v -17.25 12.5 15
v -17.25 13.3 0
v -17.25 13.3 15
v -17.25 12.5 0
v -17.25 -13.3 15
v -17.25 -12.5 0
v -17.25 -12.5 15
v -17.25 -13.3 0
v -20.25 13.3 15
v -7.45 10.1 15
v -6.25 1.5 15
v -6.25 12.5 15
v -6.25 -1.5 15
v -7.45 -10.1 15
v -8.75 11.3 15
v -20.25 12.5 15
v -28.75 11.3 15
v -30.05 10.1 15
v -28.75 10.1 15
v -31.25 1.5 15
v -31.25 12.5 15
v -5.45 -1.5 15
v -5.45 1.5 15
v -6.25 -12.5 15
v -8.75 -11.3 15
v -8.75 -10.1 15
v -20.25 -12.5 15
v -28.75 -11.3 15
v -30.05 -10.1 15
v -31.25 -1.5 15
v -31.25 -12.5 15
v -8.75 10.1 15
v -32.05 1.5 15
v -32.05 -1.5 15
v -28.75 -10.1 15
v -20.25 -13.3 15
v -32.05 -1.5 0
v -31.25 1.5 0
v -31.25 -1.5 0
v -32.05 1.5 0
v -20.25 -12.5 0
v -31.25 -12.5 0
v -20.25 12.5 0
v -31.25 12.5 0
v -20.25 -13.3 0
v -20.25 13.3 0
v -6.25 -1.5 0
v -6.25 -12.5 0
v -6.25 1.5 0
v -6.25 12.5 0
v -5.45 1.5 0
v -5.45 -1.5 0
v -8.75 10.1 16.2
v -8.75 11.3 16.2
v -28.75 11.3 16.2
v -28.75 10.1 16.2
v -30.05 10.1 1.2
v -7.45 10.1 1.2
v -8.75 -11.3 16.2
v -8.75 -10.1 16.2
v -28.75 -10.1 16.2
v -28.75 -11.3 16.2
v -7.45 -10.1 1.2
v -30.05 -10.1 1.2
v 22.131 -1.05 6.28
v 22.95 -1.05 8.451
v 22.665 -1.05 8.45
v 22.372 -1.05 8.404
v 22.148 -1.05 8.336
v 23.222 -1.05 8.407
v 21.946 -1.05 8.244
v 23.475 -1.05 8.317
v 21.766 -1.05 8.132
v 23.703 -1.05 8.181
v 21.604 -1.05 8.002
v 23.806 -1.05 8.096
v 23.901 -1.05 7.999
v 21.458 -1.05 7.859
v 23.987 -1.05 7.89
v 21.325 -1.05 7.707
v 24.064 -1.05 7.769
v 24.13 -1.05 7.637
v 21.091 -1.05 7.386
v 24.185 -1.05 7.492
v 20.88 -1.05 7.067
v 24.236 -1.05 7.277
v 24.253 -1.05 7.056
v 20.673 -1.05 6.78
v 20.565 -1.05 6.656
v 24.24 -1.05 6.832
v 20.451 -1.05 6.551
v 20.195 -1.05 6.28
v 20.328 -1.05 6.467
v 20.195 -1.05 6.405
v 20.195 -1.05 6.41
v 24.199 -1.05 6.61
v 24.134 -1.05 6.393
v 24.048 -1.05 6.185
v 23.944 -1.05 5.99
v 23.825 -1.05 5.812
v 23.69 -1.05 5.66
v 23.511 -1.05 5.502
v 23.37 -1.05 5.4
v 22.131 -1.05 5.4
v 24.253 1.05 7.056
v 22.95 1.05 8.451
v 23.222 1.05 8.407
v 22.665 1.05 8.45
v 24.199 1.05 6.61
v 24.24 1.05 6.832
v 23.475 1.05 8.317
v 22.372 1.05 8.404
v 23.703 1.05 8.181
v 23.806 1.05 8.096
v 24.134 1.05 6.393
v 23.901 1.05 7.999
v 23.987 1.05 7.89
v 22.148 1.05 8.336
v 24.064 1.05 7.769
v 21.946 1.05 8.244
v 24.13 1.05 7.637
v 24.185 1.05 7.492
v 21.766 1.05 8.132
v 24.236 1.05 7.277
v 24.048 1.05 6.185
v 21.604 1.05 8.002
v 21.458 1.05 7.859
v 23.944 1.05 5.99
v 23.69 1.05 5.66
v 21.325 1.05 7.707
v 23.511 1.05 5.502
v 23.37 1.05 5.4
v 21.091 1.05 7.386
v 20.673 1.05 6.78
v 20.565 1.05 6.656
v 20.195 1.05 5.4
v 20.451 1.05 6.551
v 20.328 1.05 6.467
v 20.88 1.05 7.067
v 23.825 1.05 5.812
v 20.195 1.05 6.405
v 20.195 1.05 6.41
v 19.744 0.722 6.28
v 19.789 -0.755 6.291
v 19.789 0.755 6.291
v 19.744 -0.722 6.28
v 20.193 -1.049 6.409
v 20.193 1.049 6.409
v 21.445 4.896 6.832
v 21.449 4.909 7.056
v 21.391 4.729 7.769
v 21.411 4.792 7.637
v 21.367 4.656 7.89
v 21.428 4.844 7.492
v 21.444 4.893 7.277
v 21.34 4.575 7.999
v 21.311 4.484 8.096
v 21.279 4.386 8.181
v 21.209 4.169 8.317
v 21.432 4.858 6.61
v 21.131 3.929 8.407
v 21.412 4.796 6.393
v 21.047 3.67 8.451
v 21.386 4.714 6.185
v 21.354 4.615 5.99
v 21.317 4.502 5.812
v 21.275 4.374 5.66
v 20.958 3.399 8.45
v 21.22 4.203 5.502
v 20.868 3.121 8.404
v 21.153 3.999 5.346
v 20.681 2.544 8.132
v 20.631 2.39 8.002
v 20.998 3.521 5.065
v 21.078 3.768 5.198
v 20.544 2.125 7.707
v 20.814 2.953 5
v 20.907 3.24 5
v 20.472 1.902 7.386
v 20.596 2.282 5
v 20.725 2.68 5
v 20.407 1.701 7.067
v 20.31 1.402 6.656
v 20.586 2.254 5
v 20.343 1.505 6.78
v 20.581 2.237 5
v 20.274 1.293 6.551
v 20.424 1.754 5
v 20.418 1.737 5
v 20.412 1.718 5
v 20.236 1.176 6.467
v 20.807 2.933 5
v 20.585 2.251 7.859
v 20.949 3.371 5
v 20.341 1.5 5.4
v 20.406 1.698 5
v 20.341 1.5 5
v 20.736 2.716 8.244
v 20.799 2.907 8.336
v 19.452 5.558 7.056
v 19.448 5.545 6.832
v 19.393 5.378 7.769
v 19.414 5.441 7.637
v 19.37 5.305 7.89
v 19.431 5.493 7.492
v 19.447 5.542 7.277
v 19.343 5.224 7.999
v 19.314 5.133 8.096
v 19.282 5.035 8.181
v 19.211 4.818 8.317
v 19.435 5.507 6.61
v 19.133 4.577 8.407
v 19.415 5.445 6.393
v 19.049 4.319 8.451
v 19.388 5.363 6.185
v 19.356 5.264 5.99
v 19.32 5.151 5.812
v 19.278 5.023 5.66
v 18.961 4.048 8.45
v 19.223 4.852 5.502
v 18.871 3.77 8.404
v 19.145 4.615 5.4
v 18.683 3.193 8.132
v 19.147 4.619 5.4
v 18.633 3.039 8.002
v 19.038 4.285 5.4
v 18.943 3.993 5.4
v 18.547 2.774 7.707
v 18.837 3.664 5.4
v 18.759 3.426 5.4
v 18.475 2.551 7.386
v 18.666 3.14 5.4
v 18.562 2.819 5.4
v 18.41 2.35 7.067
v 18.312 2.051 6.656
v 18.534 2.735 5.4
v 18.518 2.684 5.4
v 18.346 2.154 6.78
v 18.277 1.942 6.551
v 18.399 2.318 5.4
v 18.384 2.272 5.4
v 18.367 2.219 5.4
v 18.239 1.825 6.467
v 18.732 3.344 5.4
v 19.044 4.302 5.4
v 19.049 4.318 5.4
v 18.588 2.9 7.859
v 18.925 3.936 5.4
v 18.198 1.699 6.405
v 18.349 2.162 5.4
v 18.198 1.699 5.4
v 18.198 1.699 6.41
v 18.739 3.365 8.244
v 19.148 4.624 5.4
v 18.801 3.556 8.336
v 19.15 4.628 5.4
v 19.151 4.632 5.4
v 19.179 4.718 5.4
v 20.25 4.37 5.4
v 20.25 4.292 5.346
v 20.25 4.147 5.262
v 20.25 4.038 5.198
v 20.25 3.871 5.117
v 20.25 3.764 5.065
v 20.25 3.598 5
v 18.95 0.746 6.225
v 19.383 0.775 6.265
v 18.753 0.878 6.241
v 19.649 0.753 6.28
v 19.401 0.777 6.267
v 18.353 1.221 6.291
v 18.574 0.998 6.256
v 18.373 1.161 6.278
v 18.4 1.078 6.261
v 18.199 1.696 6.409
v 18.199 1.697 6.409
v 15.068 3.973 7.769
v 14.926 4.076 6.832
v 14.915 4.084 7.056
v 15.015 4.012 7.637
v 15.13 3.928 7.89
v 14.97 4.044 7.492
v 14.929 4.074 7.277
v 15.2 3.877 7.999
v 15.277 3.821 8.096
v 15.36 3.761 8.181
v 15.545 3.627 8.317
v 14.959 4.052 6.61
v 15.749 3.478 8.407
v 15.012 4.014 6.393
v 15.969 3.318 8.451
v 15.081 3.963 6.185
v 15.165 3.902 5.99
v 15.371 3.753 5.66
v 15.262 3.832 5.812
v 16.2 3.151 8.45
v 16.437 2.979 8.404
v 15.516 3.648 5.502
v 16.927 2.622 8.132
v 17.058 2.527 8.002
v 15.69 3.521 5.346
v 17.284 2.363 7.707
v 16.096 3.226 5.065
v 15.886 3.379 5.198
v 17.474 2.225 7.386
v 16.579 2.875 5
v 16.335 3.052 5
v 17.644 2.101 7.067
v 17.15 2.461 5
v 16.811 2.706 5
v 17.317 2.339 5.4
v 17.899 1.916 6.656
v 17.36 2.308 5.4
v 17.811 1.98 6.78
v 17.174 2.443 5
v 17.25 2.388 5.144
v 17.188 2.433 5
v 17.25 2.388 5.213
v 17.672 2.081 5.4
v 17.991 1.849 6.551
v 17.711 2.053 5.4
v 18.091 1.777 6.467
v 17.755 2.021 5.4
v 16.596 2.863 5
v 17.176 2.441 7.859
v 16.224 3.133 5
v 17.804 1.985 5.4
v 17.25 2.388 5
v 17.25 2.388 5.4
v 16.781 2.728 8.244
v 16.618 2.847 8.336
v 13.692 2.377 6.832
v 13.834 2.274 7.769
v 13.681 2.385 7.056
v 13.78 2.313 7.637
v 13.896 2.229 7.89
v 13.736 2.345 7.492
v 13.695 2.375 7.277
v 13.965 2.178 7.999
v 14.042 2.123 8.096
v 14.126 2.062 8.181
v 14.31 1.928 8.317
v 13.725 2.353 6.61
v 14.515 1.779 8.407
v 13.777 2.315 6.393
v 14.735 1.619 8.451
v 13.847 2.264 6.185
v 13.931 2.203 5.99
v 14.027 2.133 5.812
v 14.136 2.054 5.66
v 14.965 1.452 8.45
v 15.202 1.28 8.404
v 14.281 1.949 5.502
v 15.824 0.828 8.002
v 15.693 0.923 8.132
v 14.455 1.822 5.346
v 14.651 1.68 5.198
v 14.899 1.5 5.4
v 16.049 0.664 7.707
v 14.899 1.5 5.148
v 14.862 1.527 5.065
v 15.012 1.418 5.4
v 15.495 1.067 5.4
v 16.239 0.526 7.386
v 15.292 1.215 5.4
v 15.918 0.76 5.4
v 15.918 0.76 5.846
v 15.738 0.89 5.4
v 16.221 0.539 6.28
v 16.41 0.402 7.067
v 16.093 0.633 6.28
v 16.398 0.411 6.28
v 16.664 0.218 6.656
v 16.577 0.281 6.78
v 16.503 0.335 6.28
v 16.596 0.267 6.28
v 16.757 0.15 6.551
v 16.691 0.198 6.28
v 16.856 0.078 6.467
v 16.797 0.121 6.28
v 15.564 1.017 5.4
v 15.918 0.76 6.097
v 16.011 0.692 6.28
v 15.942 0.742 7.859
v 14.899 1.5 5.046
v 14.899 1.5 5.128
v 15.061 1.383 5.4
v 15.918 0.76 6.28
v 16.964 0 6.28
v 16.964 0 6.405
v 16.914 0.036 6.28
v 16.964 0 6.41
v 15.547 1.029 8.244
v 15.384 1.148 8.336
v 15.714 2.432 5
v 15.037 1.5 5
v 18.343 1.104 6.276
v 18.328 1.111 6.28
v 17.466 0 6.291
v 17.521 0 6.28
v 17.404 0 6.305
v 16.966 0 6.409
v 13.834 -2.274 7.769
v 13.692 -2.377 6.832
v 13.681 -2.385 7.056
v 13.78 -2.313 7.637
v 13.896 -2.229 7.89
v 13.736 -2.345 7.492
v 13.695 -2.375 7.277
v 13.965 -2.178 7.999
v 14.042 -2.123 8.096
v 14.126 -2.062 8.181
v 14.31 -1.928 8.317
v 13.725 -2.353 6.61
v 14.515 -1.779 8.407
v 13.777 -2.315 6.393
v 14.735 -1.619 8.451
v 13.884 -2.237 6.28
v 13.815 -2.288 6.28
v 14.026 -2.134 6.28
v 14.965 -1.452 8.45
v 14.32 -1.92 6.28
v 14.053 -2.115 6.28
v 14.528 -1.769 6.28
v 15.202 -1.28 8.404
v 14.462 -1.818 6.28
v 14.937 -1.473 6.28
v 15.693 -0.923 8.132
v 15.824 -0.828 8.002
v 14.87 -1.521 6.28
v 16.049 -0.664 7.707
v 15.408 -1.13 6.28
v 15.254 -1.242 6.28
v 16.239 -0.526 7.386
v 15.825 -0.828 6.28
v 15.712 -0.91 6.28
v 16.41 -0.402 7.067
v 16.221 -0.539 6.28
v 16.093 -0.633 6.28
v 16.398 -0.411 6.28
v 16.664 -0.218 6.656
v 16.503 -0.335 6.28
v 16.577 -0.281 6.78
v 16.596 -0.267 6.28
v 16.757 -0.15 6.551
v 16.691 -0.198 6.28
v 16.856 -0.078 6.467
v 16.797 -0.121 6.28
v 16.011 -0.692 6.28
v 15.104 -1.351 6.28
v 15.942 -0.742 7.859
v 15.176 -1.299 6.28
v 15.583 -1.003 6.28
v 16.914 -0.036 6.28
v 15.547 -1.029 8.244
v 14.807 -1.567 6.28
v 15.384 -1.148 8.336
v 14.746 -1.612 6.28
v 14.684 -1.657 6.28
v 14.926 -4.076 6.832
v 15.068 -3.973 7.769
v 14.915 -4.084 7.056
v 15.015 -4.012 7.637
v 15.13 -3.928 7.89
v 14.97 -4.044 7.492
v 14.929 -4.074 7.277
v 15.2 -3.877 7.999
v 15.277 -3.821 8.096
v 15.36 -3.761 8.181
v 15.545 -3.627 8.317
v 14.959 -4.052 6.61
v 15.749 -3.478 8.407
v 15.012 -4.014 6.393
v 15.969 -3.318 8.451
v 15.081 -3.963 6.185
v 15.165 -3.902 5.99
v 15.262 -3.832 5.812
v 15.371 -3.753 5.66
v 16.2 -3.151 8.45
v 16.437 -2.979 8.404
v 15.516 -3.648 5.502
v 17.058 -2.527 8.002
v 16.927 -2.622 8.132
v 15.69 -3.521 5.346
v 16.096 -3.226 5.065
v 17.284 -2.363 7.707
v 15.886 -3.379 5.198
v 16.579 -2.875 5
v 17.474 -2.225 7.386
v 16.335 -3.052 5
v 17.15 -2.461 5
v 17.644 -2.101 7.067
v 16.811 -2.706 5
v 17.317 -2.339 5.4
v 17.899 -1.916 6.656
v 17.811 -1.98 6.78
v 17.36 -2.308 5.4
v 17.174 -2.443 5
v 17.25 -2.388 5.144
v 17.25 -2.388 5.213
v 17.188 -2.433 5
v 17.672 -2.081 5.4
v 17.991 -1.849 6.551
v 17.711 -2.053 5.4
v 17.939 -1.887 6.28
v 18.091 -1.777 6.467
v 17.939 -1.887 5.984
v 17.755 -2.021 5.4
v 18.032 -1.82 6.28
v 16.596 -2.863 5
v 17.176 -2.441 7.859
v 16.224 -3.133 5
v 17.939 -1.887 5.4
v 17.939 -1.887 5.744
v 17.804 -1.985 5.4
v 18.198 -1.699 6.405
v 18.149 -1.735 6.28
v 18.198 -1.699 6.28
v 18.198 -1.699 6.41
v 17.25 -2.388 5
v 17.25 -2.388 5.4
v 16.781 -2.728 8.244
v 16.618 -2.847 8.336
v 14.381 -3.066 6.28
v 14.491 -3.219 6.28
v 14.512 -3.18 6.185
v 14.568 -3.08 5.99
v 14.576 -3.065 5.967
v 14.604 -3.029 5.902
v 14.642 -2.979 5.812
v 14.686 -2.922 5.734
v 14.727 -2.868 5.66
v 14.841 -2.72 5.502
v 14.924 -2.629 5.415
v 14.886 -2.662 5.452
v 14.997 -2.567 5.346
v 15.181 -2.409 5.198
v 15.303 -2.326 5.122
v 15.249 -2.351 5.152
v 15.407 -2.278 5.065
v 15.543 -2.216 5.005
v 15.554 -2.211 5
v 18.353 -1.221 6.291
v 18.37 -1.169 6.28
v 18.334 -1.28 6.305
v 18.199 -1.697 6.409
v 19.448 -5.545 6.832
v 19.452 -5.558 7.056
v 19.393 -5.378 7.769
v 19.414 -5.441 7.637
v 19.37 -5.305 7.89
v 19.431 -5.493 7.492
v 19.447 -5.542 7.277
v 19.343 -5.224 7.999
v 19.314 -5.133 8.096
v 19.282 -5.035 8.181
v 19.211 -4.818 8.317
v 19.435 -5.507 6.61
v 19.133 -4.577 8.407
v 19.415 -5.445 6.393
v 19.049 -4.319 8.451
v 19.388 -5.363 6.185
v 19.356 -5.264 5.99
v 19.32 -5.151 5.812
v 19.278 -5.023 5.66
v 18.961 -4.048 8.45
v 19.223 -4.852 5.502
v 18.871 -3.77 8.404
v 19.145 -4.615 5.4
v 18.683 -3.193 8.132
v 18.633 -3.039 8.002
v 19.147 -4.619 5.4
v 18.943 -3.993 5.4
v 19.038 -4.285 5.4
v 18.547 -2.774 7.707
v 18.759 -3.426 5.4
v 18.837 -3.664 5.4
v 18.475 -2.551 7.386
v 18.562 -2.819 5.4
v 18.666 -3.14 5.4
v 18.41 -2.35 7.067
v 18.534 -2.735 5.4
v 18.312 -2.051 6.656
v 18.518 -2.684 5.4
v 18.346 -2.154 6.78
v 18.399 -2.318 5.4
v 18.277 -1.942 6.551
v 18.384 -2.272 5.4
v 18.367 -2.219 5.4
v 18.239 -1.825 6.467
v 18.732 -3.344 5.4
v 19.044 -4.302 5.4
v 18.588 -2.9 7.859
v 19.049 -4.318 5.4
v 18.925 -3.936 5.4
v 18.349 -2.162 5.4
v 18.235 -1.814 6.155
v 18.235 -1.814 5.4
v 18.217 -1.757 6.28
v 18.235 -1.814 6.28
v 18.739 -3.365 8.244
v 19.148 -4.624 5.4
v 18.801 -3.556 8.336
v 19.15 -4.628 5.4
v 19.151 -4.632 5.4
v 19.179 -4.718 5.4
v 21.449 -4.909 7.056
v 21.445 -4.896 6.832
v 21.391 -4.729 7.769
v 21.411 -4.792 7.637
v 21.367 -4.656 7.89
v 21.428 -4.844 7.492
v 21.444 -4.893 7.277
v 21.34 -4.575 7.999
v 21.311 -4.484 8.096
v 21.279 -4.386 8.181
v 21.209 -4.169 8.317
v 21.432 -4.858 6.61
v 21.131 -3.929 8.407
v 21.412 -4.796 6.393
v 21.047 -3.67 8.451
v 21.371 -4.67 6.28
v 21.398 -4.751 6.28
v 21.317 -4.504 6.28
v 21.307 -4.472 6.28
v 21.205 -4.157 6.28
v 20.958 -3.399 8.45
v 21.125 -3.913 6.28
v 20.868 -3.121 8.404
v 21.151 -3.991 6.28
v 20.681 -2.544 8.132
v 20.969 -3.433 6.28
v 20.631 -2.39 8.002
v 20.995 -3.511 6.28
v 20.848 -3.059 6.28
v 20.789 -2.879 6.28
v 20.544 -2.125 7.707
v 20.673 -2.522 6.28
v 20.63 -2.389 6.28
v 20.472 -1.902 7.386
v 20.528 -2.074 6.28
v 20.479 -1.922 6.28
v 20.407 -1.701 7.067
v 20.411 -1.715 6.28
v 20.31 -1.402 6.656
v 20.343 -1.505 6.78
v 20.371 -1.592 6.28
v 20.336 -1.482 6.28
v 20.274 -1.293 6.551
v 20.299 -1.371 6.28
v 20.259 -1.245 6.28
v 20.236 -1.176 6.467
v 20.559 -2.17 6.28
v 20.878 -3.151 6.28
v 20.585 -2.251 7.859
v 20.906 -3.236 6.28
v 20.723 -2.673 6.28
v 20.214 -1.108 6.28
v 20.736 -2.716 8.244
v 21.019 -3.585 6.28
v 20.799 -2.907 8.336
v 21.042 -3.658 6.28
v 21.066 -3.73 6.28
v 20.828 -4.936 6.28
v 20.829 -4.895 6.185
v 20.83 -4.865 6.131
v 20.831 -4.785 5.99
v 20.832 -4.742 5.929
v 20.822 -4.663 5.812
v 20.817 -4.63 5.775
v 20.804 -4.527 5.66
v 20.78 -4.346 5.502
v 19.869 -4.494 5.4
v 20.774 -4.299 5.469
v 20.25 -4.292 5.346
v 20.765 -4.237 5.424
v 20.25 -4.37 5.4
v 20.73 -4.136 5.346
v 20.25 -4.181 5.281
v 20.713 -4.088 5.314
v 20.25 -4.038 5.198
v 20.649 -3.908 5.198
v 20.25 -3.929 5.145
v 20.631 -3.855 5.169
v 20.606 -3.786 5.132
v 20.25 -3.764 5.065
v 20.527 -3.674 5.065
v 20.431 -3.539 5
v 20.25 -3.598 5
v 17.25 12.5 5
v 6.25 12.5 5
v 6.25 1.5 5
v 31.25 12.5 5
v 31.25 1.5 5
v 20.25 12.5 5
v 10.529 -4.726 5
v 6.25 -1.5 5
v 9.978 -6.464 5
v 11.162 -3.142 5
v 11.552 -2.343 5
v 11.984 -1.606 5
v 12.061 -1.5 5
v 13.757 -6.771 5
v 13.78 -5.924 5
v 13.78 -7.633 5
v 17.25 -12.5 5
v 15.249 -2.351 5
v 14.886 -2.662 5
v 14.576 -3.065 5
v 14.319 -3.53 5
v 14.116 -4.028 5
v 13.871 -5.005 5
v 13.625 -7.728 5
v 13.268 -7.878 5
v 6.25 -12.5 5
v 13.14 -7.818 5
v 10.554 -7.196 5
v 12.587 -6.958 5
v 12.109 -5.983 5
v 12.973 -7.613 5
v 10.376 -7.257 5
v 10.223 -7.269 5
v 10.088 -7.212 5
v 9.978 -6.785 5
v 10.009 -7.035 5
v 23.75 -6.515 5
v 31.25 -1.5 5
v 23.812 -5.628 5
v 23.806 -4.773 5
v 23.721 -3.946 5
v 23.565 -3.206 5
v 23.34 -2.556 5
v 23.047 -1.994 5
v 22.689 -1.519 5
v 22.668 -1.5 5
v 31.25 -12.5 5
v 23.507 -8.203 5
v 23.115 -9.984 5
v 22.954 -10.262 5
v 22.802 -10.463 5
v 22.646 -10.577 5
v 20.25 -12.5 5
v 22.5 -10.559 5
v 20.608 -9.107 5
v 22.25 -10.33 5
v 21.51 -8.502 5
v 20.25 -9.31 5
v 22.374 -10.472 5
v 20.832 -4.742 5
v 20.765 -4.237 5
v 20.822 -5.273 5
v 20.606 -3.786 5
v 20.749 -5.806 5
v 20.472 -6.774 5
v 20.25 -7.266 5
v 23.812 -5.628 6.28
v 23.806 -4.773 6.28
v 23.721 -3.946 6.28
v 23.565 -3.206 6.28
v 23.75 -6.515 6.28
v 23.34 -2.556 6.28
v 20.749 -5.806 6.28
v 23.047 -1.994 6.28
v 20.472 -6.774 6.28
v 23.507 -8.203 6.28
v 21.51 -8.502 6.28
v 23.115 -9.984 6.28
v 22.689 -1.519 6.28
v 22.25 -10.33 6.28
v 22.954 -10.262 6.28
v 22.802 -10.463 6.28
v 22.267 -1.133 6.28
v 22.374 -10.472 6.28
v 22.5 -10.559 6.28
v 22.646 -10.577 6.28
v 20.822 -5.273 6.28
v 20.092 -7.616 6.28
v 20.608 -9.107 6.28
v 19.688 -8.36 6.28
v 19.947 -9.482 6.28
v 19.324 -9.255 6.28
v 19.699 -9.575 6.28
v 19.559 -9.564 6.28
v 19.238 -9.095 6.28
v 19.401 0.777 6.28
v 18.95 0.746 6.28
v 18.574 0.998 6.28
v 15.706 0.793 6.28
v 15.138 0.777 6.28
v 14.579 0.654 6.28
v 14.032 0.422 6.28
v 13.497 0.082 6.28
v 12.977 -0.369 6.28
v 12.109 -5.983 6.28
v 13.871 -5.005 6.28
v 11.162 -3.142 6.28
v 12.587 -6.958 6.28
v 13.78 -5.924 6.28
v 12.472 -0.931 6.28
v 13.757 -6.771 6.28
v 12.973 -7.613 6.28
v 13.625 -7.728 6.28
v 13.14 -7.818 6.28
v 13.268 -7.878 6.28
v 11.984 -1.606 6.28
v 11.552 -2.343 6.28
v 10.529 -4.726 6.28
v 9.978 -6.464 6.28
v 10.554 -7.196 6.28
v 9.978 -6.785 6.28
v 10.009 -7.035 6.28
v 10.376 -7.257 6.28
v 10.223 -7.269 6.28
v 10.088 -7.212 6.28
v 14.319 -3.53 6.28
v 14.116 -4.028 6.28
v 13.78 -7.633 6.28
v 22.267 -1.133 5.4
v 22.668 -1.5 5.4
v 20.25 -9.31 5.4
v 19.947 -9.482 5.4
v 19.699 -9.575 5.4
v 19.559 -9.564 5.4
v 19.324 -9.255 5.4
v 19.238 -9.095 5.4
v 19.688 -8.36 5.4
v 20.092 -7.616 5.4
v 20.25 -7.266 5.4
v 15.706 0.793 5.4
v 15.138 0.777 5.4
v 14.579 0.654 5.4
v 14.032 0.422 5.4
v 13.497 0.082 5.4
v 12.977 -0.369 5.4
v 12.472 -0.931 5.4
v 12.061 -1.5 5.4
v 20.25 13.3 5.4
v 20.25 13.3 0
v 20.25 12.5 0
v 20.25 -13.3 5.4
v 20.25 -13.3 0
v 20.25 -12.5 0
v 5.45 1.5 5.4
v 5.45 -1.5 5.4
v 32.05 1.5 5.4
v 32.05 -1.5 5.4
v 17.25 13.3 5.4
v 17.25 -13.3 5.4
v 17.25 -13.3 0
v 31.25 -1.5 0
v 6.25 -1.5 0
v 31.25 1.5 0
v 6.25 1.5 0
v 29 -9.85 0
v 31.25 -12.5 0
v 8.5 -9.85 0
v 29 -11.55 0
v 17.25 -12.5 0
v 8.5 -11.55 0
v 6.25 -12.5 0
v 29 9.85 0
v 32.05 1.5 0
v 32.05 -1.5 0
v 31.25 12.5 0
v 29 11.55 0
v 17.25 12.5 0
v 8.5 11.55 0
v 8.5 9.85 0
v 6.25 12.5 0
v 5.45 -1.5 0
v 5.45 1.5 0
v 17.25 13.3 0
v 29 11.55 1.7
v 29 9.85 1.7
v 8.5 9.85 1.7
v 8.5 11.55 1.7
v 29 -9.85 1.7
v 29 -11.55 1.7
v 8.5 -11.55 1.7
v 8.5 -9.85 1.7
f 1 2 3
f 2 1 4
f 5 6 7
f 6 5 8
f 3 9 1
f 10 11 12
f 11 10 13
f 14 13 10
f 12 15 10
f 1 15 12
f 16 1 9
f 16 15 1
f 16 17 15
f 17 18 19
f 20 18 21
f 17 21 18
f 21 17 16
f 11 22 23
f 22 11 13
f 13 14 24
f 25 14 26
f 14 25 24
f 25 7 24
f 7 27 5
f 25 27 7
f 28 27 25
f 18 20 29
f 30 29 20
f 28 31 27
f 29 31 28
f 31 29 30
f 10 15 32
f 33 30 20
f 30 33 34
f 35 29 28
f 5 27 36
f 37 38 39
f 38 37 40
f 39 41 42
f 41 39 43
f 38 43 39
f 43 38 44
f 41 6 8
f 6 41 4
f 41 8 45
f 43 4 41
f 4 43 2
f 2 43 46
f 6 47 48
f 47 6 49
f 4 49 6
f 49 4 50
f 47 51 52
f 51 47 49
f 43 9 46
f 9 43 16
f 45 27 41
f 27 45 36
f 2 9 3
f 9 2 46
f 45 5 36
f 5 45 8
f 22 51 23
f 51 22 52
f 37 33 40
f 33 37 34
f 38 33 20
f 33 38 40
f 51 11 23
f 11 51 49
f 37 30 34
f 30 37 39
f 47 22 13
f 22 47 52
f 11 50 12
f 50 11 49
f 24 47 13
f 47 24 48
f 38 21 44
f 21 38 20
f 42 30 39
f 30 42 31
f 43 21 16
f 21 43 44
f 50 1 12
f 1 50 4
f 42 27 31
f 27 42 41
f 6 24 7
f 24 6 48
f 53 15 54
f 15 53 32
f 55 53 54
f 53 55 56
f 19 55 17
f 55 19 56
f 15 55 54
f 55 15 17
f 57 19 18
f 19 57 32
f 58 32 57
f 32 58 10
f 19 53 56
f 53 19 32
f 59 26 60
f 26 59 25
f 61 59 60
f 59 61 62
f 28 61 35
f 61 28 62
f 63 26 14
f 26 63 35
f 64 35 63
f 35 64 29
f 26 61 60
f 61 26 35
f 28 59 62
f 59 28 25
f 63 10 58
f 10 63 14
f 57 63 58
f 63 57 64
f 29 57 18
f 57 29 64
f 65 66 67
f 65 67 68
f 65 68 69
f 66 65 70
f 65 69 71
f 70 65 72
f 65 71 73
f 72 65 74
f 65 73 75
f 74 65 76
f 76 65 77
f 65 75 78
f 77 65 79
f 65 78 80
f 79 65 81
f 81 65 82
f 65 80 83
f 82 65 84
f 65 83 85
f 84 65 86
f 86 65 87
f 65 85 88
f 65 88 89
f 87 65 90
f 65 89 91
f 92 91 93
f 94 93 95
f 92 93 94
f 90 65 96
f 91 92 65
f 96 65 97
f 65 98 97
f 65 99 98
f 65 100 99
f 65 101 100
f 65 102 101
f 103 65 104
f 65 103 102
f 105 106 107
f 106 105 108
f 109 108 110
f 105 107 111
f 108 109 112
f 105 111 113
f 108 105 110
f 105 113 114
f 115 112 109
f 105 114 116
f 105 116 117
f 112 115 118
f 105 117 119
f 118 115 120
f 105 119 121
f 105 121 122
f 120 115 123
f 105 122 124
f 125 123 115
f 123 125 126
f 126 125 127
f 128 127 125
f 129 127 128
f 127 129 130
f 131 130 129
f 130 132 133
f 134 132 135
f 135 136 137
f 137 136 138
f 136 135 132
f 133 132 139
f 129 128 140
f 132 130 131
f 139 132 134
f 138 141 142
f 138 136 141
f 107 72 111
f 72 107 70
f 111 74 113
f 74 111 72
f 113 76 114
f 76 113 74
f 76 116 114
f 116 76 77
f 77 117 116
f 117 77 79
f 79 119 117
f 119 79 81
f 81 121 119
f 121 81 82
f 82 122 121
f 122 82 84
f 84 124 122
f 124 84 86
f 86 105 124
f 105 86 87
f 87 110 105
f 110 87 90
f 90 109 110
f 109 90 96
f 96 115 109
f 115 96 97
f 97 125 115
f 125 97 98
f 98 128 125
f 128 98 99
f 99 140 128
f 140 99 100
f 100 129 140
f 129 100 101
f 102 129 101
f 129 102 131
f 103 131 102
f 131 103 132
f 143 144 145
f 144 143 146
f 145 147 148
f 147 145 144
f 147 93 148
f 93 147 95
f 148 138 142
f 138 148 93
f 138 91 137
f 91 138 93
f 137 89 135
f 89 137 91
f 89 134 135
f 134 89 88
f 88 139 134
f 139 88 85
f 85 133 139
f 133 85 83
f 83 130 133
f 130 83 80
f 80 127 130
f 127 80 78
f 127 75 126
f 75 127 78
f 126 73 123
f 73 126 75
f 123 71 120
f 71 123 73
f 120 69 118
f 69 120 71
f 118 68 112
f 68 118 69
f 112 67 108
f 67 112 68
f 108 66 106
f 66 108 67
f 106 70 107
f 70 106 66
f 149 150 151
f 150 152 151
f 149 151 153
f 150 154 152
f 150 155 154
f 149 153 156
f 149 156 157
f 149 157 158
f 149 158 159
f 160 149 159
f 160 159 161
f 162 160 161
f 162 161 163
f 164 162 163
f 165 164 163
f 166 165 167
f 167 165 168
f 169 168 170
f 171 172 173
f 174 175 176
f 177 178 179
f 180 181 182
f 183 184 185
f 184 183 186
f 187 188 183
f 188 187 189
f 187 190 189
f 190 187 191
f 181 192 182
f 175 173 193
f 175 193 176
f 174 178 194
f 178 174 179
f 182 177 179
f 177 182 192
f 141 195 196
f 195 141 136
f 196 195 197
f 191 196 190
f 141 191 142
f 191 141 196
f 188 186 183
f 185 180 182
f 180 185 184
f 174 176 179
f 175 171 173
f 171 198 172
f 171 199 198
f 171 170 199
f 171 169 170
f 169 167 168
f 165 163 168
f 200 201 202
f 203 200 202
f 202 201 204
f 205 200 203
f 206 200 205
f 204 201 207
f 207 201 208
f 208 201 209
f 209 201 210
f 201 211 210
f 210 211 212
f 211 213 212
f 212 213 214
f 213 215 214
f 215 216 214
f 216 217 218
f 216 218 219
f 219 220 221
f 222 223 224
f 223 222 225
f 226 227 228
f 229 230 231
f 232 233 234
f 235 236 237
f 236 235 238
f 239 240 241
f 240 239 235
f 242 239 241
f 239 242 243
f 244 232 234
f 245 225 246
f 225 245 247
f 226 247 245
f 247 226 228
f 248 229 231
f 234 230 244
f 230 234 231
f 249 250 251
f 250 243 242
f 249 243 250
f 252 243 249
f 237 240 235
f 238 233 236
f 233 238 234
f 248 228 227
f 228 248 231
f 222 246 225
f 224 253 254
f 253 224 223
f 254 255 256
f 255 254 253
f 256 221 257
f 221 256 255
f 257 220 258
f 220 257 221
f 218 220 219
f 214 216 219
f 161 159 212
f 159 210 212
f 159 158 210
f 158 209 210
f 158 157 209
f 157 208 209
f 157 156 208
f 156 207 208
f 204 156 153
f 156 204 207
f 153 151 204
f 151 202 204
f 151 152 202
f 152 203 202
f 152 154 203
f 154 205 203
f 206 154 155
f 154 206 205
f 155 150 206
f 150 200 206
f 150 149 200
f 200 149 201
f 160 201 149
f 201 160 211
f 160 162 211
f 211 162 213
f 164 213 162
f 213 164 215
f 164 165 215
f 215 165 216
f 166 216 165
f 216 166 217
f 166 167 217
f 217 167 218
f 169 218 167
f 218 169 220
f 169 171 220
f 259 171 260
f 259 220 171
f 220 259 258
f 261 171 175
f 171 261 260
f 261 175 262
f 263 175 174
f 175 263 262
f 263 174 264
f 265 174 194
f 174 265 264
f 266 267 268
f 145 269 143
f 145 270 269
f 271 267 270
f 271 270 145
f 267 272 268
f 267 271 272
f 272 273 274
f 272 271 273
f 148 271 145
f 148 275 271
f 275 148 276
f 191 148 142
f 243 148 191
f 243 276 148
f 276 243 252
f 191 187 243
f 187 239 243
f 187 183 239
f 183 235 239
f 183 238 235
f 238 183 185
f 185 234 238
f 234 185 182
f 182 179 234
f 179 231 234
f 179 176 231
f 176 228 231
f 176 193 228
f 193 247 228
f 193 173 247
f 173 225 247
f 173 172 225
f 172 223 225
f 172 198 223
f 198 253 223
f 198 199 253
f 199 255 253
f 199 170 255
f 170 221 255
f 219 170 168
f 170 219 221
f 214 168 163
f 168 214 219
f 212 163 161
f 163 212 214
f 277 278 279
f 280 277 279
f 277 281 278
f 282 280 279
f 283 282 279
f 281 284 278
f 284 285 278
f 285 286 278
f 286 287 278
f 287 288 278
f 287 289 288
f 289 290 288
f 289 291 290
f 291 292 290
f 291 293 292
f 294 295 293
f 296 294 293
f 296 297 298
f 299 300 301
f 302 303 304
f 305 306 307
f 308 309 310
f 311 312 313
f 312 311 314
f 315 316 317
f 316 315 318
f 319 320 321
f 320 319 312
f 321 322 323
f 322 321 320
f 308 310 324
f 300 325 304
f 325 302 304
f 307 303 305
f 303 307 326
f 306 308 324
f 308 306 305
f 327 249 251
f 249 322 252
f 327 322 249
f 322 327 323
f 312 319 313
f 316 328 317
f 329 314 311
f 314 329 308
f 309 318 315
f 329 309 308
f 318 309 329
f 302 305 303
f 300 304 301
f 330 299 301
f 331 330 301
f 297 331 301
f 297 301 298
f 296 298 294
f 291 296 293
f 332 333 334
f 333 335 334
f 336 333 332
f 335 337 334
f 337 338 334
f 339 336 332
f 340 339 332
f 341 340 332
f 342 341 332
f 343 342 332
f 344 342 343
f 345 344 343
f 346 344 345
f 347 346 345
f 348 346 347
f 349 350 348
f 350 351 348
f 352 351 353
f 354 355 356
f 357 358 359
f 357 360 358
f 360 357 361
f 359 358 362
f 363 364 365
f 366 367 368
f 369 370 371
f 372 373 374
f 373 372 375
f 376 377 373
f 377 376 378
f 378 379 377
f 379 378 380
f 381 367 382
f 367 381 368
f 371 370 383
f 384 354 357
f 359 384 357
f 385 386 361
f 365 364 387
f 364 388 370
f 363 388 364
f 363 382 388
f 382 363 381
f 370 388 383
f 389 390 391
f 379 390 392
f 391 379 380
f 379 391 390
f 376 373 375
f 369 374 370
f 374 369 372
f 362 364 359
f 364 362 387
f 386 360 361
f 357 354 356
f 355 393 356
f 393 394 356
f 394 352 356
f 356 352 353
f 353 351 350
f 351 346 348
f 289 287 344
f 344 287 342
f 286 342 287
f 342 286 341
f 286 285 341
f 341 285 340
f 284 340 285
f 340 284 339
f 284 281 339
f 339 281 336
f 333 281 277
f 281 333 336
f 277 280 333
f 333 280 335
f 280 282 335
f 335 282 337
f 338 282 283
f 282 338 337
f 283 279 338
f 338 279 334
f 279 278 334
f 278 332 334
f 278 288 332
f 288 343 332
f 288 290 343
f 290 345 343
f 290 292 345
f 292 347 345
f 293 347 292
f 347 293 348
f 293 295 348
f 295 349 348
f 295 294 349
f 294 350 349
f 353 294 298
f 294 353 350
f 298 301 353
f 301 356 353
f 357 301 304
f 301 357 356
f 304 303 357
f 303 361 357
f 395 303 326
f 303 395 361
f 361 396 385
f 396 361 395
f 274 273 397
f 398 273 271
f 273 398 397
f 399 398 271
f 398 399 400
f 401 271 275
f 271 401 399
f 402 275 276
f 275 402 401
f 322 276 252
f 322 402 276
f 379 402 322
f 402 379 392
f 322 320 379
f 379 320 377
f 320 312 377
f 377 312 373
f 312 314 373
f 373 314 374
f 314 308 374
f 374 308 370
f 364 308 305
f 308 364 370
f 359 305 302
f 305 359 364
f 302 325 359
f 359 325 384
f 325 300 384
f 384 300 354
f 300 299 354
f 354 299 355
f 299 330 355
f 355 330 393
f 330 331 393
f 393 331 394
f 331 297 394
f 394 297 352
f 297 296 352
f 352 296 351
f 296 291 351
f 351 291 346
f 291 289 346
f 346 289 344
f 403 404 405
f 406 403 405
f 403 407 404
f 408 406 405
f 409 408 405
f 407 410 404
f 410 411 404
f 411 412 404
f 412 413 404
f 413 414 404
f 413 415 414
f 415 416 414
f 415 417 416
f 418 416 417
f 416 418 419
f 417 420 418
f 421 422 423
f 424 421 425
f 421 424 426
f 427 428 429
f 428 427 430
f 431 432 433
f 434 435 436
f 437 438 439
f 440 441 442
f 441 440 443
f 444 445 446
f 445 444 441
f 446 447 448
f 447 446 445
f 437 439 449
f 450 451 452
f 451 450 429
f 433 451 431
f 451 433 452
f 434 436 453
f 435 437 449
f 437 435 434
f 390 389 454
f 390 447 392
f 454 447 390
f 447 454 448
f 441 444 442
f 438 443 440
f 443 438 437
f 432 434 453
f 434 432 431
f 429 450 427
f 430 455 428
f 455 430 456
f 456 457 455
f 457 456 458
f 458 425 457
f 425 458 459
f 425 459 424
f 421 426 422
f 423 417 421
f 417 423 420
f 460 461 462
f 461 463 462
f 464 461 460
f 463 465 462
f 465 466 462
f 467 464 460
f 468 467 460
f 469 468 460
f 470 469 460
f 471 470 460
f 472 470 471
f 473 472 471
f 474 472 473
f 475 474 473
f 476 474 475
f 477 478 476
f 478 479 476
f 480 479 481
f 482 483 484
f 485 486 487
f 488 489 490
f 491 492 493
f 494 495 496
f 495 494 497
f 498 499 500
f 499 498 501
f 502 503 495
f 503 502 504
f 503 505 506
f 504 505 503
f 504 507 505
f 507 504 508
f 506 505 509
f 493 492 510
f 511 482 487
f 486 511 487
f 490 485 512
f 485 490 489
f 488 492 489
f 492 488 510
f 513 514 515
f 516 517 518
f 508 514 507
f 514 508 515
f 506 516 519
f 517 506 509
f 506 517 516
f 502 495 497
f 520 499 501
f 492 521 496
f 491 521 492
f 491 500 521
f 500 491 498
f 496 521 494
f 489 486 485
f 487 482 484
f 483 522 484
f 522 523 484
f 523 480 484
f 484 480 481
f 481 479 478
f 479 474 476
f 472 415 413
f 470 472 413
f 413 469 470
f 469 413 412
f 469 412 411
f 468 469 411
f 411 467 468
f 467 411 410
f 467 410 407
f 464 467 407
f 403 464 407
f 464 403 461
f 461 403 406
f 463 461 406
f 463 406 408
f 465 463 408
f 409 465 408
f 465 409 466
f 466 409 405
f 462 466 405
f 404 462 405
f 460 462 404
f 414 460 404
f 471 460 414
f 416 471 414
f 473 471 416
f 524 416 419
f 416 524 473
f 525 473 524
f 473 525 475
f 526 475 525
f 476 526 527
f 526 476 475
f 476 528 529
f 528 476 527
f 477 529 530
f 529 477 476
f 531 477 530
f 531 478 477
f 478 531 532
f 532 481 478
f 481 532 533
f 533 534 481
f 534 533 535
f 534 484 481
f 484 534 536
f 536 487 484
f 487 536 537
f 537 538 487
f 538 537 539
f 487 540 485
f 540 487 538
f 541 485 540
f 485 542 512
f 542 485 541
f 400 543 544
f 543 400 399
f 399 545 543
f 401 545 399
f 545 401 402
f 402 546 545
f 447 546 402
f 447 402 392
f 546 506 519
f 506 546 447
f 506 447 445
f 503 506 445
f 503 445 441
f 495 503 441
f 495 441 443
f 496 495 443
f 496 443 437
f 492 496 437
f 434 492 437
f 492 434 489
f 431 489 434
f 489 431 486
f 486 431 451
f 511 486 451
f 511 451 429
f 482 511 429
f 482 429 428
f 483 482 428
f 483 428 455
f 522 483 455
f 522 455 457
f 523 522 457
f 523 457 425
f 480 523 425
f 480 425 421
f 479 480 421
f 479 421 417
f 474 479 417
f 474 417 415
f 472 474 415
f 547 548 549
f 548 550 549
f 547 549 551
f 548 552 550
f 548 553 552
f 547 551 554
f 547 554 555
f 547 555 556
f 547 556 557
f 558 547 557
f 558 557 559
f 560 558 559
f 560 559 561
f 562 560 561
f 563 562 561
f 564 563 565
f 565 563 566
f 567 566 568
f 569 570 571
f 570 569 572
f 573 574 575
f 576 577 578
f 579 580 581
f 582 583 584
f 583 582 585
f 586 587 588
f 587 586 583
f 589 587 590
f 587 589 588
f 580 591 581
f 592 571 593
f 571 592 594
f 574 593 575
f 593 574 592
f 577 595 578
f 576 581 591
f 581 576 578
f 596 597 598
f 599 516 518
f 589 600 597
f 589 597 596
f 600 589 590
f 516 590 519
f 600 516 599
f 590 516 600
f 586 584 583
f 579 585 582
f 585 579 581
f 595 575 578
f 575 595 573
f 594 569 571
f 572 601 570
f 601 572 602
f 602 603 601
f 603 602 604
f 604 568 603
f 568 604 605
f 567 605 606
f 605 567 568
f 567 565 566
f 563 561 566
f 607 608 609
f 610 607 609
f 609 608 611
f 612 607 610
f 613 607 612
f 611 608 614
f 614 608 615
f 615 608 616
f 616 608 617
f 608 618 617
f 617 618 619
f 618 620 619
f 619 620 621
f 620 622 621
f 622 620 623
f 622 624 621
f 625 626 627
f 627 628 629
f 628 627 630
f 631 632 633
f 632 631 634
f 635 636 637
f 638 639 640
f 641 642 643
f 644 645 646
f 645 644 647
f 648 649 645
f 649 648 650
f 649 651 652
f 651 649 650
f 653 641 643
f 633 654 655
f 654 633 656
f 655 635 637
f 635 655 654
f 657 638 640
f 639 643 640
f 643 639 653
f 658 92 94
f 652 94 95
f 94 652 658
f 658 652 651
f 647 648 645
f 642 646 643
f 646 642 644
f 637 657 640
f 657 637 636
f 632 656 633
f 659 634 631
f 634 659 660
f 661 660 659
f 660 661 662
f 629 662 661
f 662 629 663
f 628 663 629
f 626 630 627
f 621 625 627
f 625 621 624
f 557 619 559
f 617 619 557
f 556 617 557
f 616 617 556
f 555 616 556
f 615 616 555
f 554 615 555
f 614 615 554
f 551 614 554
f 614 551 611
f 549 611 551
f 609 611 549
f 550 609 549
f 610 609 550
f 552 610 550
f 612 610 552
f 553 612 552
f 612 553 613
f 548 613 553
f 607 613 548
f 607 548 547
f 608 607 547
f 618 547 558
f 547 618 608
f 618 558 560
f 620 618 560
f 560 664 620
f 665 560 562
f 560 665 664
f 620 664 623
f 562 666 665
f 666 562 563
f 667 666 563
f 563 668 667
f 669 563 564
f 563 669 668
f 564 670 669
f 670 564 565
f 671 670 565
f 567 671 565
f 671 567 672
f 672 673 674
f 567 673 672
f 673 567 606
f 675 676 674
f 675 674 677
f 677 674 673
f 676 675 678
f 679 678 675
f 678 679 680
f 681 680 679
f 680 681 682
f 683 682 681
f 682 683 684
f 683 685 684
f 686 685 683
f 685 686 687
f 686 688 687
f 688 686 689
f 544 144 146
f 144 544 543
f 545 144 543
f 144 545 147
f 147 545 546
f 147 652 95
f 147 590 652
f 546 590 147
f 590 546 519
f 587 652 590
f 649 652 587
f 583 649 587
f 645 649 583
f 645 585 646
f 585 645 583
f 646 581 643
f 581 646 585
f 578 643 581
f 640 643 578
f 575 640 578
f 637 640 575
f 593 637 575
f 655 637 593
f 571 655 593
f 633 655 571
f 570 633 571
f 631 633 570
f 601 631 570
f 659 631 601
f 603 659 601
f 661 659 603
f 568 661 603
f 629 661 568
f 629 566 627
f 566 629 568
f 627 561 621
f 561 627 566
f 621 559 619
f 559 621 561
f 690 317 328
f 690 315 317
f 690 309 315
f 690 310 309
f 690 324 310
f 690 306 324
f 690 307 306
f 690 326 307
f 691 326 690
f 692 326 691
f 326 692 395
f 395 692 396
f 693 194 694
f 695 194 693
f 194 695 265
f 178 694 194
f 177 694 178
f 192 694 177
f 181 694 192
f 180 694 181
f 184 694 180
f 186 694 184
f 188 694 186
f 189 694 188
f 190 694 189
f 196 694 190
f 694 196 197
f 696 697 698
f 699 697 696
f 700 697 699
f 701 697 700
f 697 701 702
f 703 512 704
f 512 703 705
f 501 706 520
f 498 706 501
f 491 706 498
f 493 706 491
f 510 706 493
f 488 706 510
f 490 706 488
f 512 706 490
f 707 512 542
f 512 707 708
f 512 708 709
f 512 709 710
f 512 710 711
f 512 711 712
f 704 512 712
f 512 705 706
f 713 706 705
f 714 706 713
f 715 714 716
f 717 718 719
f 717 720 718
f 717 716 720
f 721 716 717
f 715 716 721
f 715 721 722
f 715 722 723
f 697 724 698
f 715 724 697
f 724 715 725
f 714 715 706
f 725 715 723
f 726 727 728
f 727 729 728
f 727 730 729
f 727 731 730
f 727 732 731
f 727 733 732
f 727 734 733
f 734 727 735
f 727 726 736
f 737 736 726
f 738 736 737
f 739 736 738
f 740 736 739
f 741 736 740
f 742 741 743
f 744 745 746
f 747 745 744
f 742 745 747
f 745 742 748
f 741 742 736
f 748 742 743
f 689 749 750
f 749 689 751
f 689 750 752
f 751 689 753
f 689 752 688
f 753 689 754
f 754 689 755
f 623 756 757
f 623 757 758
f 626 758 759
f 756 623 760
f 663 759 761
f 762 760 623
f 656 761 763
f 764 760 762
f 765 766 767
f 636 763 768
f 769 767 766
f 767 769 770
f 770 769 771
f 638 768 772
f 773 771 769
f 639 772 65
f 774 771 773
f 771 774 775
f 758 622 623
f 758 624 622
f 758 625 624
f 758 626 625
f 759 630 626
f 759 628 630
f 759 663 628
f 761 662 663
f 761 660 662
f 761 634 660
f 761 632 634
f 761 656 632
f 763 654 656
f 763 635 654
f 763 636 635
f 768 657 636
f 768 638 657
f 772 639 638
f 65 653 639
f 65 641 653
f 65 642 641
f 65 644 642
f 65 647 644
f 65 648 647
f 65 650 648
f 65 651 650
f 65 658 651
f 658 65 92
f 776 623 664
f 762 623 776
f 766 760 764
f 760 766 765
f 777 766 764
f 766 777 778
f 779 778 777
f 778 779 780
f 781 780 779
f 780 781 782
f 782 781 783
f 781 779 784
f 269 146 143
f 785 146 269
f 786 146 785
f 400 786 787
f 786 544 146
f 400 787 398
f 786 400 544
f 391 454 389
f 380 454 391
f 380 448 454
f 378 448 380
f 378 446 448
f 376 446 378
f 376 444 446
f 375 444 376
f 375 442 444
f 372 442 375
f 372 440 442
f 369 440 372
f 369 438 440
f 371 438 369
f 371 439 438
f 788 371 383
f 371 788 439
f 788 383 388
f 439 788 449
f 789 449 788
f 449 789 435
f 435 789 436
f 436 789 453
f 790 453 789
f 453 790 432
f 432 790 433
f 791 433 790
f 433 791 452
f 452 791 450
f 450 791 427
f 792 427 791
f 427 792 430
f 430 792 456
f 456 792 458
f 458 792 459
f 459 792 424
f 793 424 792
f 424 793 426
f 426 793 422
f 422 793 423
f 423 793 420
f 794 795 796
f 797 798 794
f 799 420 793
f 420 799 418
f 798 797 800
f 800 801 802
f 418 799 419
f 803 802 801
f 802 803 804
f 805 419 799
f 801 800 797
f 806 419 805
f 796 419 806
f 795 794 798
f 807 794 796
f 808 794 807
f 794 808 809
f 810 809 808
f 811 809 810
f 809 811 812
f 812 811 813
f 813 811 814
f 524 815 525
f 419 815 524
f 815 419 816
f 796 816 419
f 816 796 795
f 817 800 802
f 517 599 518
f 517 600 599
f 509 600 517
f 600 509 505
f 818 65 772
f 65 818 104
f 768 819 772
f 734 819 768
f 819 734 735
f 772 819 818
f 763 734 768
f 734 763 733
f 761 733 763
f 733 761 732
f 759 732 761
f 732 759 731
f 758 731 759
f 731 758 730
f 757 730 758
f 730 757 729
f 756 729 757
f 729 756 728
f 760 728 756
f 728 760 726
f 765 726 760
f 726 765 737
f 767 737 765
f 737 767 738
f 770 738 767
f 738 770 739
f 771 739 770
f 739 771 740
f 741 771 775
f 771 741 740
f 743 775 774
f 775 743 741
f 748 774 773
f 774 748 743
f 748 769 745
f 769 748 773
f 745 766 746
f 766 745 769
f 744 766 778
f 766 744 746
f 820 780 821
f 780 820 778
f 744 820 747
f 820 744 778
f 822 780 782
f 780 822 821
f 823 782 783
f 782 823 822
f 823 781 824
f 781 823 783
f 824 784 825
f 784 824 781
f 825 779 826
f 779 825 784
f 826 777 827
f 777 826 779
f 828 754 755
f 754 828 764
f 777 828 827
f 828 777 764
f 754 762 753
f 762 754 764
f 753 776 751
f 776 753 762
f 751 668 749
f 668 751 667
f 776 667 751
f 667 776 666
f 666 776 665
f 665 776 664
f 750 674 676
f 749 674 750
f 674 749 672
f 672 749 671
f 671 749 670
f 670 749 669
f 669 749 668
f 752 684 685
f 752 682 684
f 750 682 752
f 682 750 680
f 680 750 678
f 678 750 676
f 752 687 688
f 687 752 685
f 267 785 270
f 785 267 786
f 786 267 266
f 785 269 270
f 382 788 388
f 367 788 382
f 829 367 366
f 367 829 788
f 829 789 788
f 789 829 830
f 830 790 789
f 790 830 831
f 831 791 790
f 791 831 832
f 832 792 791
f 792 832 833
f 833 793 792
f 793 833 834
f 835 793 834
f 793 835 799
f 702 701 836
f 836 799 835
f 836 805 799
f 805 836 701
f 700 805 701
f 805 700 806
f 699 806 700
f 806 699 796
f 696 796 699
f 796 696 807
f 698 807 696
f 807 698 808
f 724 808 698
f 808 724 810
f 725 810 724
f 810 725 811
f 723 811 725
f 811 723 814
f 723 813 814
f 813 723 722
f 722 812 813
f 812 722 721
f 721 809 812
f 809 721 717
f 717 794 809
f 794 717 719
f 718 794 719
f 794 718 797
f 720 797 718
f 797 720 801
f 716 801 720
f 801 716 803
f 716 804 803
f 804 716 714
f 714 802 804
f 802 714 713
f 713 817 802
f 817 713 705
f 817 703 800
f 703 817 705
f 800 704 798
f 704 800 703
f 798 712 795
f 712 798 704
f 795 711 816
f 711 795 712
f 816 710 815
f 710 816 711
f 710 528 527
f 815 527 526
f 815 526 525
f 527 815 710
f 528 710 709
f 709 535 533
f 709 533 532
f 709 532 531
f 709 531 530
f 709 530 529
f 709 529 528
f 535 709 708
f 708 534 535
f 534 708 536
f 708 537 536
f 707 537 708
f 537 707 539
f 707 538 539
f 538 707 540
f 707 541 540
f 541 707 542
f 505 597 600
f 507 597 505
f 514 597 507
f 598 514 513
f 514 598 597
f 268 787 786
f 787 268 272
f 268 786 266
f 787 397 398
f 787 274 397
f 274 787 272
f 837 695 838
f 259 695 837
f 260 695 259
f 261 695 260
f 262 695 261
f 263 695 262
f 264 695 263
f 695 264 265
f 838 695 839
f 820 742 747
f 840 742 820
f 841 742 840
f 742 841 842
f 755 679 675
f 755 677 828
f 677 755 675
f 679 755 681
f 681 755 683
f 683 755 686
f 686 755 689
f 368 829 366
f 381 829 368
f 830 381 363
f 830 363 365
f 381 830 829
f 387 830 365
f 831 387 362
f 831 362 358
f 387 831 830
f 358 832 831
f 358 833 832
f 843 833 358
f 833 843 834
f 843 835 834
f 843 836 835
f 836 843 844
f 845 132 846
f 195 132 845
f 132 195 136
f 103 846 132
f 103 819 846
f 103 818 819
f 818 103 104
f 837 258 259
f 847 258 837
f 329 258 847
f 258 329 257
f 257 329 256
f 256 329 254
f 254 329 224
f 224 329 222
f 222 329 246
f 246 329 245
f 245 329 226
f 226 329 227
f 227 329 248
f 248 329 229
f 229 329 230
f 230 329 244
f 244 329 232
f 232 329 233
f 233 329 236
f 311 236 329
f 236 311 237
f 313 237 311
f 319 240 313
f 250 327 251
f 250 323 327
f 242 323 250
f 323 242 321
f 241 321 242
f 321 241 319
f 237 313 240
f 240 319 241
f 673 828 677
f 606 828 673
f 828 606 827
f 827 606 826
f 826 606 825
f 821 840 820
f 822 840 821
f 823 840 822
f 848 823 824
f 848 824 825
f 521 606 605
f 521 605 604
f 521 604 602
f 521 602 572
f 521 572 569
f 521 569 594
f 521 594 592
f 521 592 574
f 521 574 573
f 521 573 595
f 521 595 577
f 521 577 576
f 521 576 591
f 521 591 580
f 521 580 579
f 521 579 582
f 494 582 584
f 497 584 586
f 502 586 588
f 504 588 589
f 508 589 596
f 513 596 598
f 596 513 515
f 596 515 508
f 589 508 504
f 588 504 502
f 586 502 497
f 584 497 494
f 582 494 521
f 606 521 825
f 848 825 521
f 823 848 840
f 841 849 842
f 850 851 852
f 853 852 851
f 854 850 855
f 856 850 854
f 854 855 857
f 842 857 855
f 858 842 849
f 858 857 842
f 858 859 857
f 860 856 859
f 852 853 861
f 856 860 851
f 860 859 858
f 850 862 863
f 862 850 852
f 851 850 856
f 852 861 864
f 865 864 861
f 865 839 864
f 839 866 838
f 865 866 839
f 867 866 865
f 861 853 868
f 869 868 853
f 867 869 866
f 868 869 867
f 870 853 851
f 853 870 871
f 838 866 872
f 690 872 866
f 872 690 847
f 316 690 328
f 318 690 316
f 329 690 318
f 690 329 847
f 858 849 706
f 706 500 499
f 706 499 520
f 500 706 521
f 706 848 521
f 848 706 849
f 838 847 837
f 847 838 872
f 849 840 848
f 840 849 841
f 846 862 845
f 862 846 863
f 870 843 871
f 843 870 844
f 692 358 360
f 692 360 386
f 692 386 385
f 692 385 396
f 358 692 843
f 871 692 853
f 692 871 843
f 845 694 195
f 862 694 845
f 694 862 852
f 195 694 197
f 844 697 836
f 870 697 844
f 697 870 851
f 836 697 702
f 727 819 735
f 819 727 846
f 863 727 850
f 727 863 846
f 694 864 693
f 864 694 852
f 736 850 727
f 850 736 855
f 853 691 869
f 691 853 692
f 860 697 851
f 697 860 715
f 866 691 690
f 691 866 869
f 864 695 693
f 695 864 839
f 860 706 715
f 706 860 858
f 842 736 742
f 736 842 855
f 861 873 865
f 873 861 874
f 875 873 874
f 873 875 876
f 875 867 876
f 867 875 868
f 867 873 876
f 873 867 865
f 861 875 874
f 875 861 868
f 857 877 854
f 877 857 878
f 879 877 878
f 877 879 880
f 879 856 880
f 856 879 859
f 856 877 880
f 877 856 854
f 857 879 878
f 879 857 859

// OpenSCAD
/* [Parameters] */

parts = 3; // [3:both, 1:box_only, 2:lid_only]
width = 25;
height = 20;
depth = 25;

/* [Ribbons] */
bowRotation = 0;
ribbonPosY = 0.5;
ribbonPosX = 0.5;
ribbonWidth = 3;

/* [Hidden] */
ribbonThick = 0.8;
wallThick = 1.2;
clearance = 0.25;
fudge = 0.1;

module bowPath(h)
{
  scale([.1, .05, 3]) union()
  {
    linear_extrude(height=h)
      polygon([[-72.503724,38.556015],[-35.461921,38.475099],[-5.117411,38.004359],[8.356405,37.553620],[18.924846,36.918235],[25.124471,35.979263],[31.533352,34.284763],[37.939262,31.980477],[44.129972,29.212144],[49.893256,26.125505],[55.016886,22.866300],[59.288636,19.580270],[62.496276,16.413155],[65.324676,12.709976],[67.801789,8.651624],[69.852263,4.319713],[71.400746,-0.204147],[72.371884,-4.838345],[72.690326,-9.501268],[72.280717,-14.111305],[71.067706,-18.586845],[69.756597,-21.598936],[68.182893,-24.361622],[66.363266,-26.876196],[64.314387,-29.143955],[62.052929,-31.166192],[59.595562,-32.944203],[54.159790,-35.772724],[48.140444,-37.639875],[41.670898,-38.556015],[34.884524,-38.531502],[27.914696,-37.576695],[22.565933,-36.162339],[17.773468,-34.247880],[13.478266,-31.906696],[9.621297,-29.212162],[6.143526,-26.237656],[2.985921,-23.056553],[-2.604920,-16.368065],[-7.623490,-9.733710],[-12.542049,-3.740500],[-15.111407,-1.167766],[-17.832860,1.024552],[-20.765441,2.763078],[-23.968184,3.974435],[-33.600683,6.439524],[-41.284438,8.088342],[-52.094703,9.815595],[-58.976954,10.913058],[-61.750690,11.774639],[-64.509164,13.137595],[-66.281468,14.416025],[-67.784007,15.959765],[-70.065569,19.651223],[-71.525417,23.828058],[-72.335115,28.106360],[-72.666230,32.102218],[-72.690326,35.431720],[-72.503724,38.556015]]);
  }
}

module ribbonPath(h)
{
  scale([25.4/90, -25.4/90, 1]) union()
  {
    linear_extrude(height=h)
      polygon([[-1.889526,-28.390625],[-5.561401,-28.734375],[-9.114136,-28.496094],[-12.889526,-27.390625],[-14.835655,-25.912486],[-16.018724,-24.090613],[-16.764526,-21.890625],[-12.202026,-16.515625],[-7.694214,-12.187500],[-5.232300,-10.310547],[-2.764526,-8.890625],[-0.805879,-7.527573],[0.538709,-5.638889],[1.343336,-3.353986],[1.682100,-0.802276],[1.629098,1.886827],[1.258427,4.583912],[-0.139526,9.484375],[-2.065308,13.746094],[-4.108276,17.515625],[-6.389526,21.234375],[-5.952026,22.046875],[-4.764526,23.609375],[-4.053101,23.665527],[-2.799683,23.191406],[0.547974,21.296875],[5.110474,18.234375],[8.860474,27.484375],[9.485474,28.203125],[10.126099,28.644531],[10.860474,28.734375],[11.653442,28.160156],[12.422974,27.140625],[13.235474,25.734375],[15.219849,16.718750],[16.452271,8.173828],[16.764526,3.686768],[16.735474,-0.640625],[16.304840,-4.831084],[15.515014,-8.572587],[14.374969,-11.865976],[12.893676,-14.712091],[11.080108,-17.111773],[8.943237,-19.065862],[6.492035,-20.575199],[3.735474,-21.640625],[1.268677,-22.576660],[-0.412964,-23.644531],[-1.450073,-24.765137],[-1.983276,-25.859375],[-2.100464,-27.652344],[-1.889526,-28.390625]]);
  }
}




module bow()
{
    
    union() 
    {
        for (i=[0:5])
        {
            rotate([0,0,i*72])    
            translate([3.5,-1.5,2])    
            rotate([-90,0,0])
            scale([0.6,1.2,1])
            bowPath(1);
        }

        rotate([0,0,0])    
        translate([2.5,-7,0])
        ribbonPath(1.6);
        
        rotate([0,0,-30])
        scale([-1,1,1])
        translate([2.5,-7,0])    
        ribbonPath(1.6);
    }
}



module presentBottom(w, d, h)
{
    ribbonOffsetYExtents = d-ribbonWidth;
    ribbonOffsetY = -d/2 + (ribbonOffsetYExtents * ribbonPosY) + (ribbonWidth/2);
    
    ribbonOffsetXExtents = w-ribbonWidth;
    ribbonOffsetX = -w/2 + (ribbonOffsetXExtents * ribbonPosX) + (ribbonWidth/2);
    
    tabSize = w * 0.8;
    
    difference() {
    union() {
        translate([ribbonOffsetX,0,0])
        cube([ribbonWidth, d+(ribbonThick*2), h], center=true);
        
        translate([0,ribbonOffsetY,0])
        cube([w+(ribbonThick*2), ribbonWidth, h], center=true);
        cube([w,d,h], center=true);
        
        translate([0,d/2-(wallThick*1.5),wallThick/2])
        cube([tabSize, wallThick, h+wallThick], center=true);

        translate([0,-d/2+(wallThick*1.5),wallThick/2])
        cube([tabSize, wallThick, h+wallThick], center=true);
    }
    
    translate([0,0,wallThick])
    cube([w-(wallThick*2), d-(wallThick*4),h], center=true);
}
}

module presentTop(w, d, h)
{
    ribbonOffsetYExtents = d-ribbonWidth;
    ribbonOffsetY = -d/2 + (ribbonOffsetYExtents * ribbonPosY) + (ribbonWidth/2);
        
    ribbonOffsetXExtents = w-ribbonWidth;
    ribbonOffsetX = -w/2 + (ribbonOffsetXExtents * ribbonPosX) + (ribbonWidth/2);
    
    tabSlotSize = w * 0.8 + (clearance * 2);
    tabSlotThick = wallThick + (clearance * 2);
    tabSlotHeight = wallThick + (clearance * 3);
    
    difference() {
    difference() {
        union() {
            translate([ribbonOffsetX,0,0.2])
            cube([ribbonWidth, d+(ribbonThick*2), h+0.4], center=true);

            translate([0,ribbonOffsetY,0.2])
            cube([w+(ribbonThick*2), ribbonWidth, h+0.4], center=true);

            cube([w,d,h], center=true);
            
            rotate([0,0,bowRotation])
            translate([ribbonOffsetX,ribbonOffsetY,h/2])
            scale([0.7,0.7,0.8])
            bow();
        }
    
        translate([0,d/2-(wallThick*1.5), -h/2+tabSlotHeight/2-clearance])
        cube([tabSlotSize, tabSlotThick, tabSlotHeight], center=true);
    }
        //color([0,0,1])
        translate([0,-d/2+(wallThick*1.5), -h/2+tabSlotHeight/2-clearance])
        cube([tabSlotSize, tabSlotThick, tabSlotHeight], center=true);
}
}


module fullPresent(w, h, d, parts) {
    
    posOffset = 0.75 * w;
    
    if (parts > 0) {    
        if (parts % 2 == 1) {
            if (parts == 3) {
                translate([-posOffset,0,(h-5)/2])
                presentBottom(w, d, h-5);
            }
            else {
                translate([0,0,(height-5)/2])
                presentBottom(w, d, h-5);
            }
        }
        
        if (parts > 1) {
            if (parts == 3) {
                translate([posOffset,0,2.5])
                presentTop(w, d, 5);

            }
            else
            {
                translate([0,0,2.5])
                presentTop(w, d, 5);
            }
        }
    }
}

fullPresent(width, height, depth, parts);
